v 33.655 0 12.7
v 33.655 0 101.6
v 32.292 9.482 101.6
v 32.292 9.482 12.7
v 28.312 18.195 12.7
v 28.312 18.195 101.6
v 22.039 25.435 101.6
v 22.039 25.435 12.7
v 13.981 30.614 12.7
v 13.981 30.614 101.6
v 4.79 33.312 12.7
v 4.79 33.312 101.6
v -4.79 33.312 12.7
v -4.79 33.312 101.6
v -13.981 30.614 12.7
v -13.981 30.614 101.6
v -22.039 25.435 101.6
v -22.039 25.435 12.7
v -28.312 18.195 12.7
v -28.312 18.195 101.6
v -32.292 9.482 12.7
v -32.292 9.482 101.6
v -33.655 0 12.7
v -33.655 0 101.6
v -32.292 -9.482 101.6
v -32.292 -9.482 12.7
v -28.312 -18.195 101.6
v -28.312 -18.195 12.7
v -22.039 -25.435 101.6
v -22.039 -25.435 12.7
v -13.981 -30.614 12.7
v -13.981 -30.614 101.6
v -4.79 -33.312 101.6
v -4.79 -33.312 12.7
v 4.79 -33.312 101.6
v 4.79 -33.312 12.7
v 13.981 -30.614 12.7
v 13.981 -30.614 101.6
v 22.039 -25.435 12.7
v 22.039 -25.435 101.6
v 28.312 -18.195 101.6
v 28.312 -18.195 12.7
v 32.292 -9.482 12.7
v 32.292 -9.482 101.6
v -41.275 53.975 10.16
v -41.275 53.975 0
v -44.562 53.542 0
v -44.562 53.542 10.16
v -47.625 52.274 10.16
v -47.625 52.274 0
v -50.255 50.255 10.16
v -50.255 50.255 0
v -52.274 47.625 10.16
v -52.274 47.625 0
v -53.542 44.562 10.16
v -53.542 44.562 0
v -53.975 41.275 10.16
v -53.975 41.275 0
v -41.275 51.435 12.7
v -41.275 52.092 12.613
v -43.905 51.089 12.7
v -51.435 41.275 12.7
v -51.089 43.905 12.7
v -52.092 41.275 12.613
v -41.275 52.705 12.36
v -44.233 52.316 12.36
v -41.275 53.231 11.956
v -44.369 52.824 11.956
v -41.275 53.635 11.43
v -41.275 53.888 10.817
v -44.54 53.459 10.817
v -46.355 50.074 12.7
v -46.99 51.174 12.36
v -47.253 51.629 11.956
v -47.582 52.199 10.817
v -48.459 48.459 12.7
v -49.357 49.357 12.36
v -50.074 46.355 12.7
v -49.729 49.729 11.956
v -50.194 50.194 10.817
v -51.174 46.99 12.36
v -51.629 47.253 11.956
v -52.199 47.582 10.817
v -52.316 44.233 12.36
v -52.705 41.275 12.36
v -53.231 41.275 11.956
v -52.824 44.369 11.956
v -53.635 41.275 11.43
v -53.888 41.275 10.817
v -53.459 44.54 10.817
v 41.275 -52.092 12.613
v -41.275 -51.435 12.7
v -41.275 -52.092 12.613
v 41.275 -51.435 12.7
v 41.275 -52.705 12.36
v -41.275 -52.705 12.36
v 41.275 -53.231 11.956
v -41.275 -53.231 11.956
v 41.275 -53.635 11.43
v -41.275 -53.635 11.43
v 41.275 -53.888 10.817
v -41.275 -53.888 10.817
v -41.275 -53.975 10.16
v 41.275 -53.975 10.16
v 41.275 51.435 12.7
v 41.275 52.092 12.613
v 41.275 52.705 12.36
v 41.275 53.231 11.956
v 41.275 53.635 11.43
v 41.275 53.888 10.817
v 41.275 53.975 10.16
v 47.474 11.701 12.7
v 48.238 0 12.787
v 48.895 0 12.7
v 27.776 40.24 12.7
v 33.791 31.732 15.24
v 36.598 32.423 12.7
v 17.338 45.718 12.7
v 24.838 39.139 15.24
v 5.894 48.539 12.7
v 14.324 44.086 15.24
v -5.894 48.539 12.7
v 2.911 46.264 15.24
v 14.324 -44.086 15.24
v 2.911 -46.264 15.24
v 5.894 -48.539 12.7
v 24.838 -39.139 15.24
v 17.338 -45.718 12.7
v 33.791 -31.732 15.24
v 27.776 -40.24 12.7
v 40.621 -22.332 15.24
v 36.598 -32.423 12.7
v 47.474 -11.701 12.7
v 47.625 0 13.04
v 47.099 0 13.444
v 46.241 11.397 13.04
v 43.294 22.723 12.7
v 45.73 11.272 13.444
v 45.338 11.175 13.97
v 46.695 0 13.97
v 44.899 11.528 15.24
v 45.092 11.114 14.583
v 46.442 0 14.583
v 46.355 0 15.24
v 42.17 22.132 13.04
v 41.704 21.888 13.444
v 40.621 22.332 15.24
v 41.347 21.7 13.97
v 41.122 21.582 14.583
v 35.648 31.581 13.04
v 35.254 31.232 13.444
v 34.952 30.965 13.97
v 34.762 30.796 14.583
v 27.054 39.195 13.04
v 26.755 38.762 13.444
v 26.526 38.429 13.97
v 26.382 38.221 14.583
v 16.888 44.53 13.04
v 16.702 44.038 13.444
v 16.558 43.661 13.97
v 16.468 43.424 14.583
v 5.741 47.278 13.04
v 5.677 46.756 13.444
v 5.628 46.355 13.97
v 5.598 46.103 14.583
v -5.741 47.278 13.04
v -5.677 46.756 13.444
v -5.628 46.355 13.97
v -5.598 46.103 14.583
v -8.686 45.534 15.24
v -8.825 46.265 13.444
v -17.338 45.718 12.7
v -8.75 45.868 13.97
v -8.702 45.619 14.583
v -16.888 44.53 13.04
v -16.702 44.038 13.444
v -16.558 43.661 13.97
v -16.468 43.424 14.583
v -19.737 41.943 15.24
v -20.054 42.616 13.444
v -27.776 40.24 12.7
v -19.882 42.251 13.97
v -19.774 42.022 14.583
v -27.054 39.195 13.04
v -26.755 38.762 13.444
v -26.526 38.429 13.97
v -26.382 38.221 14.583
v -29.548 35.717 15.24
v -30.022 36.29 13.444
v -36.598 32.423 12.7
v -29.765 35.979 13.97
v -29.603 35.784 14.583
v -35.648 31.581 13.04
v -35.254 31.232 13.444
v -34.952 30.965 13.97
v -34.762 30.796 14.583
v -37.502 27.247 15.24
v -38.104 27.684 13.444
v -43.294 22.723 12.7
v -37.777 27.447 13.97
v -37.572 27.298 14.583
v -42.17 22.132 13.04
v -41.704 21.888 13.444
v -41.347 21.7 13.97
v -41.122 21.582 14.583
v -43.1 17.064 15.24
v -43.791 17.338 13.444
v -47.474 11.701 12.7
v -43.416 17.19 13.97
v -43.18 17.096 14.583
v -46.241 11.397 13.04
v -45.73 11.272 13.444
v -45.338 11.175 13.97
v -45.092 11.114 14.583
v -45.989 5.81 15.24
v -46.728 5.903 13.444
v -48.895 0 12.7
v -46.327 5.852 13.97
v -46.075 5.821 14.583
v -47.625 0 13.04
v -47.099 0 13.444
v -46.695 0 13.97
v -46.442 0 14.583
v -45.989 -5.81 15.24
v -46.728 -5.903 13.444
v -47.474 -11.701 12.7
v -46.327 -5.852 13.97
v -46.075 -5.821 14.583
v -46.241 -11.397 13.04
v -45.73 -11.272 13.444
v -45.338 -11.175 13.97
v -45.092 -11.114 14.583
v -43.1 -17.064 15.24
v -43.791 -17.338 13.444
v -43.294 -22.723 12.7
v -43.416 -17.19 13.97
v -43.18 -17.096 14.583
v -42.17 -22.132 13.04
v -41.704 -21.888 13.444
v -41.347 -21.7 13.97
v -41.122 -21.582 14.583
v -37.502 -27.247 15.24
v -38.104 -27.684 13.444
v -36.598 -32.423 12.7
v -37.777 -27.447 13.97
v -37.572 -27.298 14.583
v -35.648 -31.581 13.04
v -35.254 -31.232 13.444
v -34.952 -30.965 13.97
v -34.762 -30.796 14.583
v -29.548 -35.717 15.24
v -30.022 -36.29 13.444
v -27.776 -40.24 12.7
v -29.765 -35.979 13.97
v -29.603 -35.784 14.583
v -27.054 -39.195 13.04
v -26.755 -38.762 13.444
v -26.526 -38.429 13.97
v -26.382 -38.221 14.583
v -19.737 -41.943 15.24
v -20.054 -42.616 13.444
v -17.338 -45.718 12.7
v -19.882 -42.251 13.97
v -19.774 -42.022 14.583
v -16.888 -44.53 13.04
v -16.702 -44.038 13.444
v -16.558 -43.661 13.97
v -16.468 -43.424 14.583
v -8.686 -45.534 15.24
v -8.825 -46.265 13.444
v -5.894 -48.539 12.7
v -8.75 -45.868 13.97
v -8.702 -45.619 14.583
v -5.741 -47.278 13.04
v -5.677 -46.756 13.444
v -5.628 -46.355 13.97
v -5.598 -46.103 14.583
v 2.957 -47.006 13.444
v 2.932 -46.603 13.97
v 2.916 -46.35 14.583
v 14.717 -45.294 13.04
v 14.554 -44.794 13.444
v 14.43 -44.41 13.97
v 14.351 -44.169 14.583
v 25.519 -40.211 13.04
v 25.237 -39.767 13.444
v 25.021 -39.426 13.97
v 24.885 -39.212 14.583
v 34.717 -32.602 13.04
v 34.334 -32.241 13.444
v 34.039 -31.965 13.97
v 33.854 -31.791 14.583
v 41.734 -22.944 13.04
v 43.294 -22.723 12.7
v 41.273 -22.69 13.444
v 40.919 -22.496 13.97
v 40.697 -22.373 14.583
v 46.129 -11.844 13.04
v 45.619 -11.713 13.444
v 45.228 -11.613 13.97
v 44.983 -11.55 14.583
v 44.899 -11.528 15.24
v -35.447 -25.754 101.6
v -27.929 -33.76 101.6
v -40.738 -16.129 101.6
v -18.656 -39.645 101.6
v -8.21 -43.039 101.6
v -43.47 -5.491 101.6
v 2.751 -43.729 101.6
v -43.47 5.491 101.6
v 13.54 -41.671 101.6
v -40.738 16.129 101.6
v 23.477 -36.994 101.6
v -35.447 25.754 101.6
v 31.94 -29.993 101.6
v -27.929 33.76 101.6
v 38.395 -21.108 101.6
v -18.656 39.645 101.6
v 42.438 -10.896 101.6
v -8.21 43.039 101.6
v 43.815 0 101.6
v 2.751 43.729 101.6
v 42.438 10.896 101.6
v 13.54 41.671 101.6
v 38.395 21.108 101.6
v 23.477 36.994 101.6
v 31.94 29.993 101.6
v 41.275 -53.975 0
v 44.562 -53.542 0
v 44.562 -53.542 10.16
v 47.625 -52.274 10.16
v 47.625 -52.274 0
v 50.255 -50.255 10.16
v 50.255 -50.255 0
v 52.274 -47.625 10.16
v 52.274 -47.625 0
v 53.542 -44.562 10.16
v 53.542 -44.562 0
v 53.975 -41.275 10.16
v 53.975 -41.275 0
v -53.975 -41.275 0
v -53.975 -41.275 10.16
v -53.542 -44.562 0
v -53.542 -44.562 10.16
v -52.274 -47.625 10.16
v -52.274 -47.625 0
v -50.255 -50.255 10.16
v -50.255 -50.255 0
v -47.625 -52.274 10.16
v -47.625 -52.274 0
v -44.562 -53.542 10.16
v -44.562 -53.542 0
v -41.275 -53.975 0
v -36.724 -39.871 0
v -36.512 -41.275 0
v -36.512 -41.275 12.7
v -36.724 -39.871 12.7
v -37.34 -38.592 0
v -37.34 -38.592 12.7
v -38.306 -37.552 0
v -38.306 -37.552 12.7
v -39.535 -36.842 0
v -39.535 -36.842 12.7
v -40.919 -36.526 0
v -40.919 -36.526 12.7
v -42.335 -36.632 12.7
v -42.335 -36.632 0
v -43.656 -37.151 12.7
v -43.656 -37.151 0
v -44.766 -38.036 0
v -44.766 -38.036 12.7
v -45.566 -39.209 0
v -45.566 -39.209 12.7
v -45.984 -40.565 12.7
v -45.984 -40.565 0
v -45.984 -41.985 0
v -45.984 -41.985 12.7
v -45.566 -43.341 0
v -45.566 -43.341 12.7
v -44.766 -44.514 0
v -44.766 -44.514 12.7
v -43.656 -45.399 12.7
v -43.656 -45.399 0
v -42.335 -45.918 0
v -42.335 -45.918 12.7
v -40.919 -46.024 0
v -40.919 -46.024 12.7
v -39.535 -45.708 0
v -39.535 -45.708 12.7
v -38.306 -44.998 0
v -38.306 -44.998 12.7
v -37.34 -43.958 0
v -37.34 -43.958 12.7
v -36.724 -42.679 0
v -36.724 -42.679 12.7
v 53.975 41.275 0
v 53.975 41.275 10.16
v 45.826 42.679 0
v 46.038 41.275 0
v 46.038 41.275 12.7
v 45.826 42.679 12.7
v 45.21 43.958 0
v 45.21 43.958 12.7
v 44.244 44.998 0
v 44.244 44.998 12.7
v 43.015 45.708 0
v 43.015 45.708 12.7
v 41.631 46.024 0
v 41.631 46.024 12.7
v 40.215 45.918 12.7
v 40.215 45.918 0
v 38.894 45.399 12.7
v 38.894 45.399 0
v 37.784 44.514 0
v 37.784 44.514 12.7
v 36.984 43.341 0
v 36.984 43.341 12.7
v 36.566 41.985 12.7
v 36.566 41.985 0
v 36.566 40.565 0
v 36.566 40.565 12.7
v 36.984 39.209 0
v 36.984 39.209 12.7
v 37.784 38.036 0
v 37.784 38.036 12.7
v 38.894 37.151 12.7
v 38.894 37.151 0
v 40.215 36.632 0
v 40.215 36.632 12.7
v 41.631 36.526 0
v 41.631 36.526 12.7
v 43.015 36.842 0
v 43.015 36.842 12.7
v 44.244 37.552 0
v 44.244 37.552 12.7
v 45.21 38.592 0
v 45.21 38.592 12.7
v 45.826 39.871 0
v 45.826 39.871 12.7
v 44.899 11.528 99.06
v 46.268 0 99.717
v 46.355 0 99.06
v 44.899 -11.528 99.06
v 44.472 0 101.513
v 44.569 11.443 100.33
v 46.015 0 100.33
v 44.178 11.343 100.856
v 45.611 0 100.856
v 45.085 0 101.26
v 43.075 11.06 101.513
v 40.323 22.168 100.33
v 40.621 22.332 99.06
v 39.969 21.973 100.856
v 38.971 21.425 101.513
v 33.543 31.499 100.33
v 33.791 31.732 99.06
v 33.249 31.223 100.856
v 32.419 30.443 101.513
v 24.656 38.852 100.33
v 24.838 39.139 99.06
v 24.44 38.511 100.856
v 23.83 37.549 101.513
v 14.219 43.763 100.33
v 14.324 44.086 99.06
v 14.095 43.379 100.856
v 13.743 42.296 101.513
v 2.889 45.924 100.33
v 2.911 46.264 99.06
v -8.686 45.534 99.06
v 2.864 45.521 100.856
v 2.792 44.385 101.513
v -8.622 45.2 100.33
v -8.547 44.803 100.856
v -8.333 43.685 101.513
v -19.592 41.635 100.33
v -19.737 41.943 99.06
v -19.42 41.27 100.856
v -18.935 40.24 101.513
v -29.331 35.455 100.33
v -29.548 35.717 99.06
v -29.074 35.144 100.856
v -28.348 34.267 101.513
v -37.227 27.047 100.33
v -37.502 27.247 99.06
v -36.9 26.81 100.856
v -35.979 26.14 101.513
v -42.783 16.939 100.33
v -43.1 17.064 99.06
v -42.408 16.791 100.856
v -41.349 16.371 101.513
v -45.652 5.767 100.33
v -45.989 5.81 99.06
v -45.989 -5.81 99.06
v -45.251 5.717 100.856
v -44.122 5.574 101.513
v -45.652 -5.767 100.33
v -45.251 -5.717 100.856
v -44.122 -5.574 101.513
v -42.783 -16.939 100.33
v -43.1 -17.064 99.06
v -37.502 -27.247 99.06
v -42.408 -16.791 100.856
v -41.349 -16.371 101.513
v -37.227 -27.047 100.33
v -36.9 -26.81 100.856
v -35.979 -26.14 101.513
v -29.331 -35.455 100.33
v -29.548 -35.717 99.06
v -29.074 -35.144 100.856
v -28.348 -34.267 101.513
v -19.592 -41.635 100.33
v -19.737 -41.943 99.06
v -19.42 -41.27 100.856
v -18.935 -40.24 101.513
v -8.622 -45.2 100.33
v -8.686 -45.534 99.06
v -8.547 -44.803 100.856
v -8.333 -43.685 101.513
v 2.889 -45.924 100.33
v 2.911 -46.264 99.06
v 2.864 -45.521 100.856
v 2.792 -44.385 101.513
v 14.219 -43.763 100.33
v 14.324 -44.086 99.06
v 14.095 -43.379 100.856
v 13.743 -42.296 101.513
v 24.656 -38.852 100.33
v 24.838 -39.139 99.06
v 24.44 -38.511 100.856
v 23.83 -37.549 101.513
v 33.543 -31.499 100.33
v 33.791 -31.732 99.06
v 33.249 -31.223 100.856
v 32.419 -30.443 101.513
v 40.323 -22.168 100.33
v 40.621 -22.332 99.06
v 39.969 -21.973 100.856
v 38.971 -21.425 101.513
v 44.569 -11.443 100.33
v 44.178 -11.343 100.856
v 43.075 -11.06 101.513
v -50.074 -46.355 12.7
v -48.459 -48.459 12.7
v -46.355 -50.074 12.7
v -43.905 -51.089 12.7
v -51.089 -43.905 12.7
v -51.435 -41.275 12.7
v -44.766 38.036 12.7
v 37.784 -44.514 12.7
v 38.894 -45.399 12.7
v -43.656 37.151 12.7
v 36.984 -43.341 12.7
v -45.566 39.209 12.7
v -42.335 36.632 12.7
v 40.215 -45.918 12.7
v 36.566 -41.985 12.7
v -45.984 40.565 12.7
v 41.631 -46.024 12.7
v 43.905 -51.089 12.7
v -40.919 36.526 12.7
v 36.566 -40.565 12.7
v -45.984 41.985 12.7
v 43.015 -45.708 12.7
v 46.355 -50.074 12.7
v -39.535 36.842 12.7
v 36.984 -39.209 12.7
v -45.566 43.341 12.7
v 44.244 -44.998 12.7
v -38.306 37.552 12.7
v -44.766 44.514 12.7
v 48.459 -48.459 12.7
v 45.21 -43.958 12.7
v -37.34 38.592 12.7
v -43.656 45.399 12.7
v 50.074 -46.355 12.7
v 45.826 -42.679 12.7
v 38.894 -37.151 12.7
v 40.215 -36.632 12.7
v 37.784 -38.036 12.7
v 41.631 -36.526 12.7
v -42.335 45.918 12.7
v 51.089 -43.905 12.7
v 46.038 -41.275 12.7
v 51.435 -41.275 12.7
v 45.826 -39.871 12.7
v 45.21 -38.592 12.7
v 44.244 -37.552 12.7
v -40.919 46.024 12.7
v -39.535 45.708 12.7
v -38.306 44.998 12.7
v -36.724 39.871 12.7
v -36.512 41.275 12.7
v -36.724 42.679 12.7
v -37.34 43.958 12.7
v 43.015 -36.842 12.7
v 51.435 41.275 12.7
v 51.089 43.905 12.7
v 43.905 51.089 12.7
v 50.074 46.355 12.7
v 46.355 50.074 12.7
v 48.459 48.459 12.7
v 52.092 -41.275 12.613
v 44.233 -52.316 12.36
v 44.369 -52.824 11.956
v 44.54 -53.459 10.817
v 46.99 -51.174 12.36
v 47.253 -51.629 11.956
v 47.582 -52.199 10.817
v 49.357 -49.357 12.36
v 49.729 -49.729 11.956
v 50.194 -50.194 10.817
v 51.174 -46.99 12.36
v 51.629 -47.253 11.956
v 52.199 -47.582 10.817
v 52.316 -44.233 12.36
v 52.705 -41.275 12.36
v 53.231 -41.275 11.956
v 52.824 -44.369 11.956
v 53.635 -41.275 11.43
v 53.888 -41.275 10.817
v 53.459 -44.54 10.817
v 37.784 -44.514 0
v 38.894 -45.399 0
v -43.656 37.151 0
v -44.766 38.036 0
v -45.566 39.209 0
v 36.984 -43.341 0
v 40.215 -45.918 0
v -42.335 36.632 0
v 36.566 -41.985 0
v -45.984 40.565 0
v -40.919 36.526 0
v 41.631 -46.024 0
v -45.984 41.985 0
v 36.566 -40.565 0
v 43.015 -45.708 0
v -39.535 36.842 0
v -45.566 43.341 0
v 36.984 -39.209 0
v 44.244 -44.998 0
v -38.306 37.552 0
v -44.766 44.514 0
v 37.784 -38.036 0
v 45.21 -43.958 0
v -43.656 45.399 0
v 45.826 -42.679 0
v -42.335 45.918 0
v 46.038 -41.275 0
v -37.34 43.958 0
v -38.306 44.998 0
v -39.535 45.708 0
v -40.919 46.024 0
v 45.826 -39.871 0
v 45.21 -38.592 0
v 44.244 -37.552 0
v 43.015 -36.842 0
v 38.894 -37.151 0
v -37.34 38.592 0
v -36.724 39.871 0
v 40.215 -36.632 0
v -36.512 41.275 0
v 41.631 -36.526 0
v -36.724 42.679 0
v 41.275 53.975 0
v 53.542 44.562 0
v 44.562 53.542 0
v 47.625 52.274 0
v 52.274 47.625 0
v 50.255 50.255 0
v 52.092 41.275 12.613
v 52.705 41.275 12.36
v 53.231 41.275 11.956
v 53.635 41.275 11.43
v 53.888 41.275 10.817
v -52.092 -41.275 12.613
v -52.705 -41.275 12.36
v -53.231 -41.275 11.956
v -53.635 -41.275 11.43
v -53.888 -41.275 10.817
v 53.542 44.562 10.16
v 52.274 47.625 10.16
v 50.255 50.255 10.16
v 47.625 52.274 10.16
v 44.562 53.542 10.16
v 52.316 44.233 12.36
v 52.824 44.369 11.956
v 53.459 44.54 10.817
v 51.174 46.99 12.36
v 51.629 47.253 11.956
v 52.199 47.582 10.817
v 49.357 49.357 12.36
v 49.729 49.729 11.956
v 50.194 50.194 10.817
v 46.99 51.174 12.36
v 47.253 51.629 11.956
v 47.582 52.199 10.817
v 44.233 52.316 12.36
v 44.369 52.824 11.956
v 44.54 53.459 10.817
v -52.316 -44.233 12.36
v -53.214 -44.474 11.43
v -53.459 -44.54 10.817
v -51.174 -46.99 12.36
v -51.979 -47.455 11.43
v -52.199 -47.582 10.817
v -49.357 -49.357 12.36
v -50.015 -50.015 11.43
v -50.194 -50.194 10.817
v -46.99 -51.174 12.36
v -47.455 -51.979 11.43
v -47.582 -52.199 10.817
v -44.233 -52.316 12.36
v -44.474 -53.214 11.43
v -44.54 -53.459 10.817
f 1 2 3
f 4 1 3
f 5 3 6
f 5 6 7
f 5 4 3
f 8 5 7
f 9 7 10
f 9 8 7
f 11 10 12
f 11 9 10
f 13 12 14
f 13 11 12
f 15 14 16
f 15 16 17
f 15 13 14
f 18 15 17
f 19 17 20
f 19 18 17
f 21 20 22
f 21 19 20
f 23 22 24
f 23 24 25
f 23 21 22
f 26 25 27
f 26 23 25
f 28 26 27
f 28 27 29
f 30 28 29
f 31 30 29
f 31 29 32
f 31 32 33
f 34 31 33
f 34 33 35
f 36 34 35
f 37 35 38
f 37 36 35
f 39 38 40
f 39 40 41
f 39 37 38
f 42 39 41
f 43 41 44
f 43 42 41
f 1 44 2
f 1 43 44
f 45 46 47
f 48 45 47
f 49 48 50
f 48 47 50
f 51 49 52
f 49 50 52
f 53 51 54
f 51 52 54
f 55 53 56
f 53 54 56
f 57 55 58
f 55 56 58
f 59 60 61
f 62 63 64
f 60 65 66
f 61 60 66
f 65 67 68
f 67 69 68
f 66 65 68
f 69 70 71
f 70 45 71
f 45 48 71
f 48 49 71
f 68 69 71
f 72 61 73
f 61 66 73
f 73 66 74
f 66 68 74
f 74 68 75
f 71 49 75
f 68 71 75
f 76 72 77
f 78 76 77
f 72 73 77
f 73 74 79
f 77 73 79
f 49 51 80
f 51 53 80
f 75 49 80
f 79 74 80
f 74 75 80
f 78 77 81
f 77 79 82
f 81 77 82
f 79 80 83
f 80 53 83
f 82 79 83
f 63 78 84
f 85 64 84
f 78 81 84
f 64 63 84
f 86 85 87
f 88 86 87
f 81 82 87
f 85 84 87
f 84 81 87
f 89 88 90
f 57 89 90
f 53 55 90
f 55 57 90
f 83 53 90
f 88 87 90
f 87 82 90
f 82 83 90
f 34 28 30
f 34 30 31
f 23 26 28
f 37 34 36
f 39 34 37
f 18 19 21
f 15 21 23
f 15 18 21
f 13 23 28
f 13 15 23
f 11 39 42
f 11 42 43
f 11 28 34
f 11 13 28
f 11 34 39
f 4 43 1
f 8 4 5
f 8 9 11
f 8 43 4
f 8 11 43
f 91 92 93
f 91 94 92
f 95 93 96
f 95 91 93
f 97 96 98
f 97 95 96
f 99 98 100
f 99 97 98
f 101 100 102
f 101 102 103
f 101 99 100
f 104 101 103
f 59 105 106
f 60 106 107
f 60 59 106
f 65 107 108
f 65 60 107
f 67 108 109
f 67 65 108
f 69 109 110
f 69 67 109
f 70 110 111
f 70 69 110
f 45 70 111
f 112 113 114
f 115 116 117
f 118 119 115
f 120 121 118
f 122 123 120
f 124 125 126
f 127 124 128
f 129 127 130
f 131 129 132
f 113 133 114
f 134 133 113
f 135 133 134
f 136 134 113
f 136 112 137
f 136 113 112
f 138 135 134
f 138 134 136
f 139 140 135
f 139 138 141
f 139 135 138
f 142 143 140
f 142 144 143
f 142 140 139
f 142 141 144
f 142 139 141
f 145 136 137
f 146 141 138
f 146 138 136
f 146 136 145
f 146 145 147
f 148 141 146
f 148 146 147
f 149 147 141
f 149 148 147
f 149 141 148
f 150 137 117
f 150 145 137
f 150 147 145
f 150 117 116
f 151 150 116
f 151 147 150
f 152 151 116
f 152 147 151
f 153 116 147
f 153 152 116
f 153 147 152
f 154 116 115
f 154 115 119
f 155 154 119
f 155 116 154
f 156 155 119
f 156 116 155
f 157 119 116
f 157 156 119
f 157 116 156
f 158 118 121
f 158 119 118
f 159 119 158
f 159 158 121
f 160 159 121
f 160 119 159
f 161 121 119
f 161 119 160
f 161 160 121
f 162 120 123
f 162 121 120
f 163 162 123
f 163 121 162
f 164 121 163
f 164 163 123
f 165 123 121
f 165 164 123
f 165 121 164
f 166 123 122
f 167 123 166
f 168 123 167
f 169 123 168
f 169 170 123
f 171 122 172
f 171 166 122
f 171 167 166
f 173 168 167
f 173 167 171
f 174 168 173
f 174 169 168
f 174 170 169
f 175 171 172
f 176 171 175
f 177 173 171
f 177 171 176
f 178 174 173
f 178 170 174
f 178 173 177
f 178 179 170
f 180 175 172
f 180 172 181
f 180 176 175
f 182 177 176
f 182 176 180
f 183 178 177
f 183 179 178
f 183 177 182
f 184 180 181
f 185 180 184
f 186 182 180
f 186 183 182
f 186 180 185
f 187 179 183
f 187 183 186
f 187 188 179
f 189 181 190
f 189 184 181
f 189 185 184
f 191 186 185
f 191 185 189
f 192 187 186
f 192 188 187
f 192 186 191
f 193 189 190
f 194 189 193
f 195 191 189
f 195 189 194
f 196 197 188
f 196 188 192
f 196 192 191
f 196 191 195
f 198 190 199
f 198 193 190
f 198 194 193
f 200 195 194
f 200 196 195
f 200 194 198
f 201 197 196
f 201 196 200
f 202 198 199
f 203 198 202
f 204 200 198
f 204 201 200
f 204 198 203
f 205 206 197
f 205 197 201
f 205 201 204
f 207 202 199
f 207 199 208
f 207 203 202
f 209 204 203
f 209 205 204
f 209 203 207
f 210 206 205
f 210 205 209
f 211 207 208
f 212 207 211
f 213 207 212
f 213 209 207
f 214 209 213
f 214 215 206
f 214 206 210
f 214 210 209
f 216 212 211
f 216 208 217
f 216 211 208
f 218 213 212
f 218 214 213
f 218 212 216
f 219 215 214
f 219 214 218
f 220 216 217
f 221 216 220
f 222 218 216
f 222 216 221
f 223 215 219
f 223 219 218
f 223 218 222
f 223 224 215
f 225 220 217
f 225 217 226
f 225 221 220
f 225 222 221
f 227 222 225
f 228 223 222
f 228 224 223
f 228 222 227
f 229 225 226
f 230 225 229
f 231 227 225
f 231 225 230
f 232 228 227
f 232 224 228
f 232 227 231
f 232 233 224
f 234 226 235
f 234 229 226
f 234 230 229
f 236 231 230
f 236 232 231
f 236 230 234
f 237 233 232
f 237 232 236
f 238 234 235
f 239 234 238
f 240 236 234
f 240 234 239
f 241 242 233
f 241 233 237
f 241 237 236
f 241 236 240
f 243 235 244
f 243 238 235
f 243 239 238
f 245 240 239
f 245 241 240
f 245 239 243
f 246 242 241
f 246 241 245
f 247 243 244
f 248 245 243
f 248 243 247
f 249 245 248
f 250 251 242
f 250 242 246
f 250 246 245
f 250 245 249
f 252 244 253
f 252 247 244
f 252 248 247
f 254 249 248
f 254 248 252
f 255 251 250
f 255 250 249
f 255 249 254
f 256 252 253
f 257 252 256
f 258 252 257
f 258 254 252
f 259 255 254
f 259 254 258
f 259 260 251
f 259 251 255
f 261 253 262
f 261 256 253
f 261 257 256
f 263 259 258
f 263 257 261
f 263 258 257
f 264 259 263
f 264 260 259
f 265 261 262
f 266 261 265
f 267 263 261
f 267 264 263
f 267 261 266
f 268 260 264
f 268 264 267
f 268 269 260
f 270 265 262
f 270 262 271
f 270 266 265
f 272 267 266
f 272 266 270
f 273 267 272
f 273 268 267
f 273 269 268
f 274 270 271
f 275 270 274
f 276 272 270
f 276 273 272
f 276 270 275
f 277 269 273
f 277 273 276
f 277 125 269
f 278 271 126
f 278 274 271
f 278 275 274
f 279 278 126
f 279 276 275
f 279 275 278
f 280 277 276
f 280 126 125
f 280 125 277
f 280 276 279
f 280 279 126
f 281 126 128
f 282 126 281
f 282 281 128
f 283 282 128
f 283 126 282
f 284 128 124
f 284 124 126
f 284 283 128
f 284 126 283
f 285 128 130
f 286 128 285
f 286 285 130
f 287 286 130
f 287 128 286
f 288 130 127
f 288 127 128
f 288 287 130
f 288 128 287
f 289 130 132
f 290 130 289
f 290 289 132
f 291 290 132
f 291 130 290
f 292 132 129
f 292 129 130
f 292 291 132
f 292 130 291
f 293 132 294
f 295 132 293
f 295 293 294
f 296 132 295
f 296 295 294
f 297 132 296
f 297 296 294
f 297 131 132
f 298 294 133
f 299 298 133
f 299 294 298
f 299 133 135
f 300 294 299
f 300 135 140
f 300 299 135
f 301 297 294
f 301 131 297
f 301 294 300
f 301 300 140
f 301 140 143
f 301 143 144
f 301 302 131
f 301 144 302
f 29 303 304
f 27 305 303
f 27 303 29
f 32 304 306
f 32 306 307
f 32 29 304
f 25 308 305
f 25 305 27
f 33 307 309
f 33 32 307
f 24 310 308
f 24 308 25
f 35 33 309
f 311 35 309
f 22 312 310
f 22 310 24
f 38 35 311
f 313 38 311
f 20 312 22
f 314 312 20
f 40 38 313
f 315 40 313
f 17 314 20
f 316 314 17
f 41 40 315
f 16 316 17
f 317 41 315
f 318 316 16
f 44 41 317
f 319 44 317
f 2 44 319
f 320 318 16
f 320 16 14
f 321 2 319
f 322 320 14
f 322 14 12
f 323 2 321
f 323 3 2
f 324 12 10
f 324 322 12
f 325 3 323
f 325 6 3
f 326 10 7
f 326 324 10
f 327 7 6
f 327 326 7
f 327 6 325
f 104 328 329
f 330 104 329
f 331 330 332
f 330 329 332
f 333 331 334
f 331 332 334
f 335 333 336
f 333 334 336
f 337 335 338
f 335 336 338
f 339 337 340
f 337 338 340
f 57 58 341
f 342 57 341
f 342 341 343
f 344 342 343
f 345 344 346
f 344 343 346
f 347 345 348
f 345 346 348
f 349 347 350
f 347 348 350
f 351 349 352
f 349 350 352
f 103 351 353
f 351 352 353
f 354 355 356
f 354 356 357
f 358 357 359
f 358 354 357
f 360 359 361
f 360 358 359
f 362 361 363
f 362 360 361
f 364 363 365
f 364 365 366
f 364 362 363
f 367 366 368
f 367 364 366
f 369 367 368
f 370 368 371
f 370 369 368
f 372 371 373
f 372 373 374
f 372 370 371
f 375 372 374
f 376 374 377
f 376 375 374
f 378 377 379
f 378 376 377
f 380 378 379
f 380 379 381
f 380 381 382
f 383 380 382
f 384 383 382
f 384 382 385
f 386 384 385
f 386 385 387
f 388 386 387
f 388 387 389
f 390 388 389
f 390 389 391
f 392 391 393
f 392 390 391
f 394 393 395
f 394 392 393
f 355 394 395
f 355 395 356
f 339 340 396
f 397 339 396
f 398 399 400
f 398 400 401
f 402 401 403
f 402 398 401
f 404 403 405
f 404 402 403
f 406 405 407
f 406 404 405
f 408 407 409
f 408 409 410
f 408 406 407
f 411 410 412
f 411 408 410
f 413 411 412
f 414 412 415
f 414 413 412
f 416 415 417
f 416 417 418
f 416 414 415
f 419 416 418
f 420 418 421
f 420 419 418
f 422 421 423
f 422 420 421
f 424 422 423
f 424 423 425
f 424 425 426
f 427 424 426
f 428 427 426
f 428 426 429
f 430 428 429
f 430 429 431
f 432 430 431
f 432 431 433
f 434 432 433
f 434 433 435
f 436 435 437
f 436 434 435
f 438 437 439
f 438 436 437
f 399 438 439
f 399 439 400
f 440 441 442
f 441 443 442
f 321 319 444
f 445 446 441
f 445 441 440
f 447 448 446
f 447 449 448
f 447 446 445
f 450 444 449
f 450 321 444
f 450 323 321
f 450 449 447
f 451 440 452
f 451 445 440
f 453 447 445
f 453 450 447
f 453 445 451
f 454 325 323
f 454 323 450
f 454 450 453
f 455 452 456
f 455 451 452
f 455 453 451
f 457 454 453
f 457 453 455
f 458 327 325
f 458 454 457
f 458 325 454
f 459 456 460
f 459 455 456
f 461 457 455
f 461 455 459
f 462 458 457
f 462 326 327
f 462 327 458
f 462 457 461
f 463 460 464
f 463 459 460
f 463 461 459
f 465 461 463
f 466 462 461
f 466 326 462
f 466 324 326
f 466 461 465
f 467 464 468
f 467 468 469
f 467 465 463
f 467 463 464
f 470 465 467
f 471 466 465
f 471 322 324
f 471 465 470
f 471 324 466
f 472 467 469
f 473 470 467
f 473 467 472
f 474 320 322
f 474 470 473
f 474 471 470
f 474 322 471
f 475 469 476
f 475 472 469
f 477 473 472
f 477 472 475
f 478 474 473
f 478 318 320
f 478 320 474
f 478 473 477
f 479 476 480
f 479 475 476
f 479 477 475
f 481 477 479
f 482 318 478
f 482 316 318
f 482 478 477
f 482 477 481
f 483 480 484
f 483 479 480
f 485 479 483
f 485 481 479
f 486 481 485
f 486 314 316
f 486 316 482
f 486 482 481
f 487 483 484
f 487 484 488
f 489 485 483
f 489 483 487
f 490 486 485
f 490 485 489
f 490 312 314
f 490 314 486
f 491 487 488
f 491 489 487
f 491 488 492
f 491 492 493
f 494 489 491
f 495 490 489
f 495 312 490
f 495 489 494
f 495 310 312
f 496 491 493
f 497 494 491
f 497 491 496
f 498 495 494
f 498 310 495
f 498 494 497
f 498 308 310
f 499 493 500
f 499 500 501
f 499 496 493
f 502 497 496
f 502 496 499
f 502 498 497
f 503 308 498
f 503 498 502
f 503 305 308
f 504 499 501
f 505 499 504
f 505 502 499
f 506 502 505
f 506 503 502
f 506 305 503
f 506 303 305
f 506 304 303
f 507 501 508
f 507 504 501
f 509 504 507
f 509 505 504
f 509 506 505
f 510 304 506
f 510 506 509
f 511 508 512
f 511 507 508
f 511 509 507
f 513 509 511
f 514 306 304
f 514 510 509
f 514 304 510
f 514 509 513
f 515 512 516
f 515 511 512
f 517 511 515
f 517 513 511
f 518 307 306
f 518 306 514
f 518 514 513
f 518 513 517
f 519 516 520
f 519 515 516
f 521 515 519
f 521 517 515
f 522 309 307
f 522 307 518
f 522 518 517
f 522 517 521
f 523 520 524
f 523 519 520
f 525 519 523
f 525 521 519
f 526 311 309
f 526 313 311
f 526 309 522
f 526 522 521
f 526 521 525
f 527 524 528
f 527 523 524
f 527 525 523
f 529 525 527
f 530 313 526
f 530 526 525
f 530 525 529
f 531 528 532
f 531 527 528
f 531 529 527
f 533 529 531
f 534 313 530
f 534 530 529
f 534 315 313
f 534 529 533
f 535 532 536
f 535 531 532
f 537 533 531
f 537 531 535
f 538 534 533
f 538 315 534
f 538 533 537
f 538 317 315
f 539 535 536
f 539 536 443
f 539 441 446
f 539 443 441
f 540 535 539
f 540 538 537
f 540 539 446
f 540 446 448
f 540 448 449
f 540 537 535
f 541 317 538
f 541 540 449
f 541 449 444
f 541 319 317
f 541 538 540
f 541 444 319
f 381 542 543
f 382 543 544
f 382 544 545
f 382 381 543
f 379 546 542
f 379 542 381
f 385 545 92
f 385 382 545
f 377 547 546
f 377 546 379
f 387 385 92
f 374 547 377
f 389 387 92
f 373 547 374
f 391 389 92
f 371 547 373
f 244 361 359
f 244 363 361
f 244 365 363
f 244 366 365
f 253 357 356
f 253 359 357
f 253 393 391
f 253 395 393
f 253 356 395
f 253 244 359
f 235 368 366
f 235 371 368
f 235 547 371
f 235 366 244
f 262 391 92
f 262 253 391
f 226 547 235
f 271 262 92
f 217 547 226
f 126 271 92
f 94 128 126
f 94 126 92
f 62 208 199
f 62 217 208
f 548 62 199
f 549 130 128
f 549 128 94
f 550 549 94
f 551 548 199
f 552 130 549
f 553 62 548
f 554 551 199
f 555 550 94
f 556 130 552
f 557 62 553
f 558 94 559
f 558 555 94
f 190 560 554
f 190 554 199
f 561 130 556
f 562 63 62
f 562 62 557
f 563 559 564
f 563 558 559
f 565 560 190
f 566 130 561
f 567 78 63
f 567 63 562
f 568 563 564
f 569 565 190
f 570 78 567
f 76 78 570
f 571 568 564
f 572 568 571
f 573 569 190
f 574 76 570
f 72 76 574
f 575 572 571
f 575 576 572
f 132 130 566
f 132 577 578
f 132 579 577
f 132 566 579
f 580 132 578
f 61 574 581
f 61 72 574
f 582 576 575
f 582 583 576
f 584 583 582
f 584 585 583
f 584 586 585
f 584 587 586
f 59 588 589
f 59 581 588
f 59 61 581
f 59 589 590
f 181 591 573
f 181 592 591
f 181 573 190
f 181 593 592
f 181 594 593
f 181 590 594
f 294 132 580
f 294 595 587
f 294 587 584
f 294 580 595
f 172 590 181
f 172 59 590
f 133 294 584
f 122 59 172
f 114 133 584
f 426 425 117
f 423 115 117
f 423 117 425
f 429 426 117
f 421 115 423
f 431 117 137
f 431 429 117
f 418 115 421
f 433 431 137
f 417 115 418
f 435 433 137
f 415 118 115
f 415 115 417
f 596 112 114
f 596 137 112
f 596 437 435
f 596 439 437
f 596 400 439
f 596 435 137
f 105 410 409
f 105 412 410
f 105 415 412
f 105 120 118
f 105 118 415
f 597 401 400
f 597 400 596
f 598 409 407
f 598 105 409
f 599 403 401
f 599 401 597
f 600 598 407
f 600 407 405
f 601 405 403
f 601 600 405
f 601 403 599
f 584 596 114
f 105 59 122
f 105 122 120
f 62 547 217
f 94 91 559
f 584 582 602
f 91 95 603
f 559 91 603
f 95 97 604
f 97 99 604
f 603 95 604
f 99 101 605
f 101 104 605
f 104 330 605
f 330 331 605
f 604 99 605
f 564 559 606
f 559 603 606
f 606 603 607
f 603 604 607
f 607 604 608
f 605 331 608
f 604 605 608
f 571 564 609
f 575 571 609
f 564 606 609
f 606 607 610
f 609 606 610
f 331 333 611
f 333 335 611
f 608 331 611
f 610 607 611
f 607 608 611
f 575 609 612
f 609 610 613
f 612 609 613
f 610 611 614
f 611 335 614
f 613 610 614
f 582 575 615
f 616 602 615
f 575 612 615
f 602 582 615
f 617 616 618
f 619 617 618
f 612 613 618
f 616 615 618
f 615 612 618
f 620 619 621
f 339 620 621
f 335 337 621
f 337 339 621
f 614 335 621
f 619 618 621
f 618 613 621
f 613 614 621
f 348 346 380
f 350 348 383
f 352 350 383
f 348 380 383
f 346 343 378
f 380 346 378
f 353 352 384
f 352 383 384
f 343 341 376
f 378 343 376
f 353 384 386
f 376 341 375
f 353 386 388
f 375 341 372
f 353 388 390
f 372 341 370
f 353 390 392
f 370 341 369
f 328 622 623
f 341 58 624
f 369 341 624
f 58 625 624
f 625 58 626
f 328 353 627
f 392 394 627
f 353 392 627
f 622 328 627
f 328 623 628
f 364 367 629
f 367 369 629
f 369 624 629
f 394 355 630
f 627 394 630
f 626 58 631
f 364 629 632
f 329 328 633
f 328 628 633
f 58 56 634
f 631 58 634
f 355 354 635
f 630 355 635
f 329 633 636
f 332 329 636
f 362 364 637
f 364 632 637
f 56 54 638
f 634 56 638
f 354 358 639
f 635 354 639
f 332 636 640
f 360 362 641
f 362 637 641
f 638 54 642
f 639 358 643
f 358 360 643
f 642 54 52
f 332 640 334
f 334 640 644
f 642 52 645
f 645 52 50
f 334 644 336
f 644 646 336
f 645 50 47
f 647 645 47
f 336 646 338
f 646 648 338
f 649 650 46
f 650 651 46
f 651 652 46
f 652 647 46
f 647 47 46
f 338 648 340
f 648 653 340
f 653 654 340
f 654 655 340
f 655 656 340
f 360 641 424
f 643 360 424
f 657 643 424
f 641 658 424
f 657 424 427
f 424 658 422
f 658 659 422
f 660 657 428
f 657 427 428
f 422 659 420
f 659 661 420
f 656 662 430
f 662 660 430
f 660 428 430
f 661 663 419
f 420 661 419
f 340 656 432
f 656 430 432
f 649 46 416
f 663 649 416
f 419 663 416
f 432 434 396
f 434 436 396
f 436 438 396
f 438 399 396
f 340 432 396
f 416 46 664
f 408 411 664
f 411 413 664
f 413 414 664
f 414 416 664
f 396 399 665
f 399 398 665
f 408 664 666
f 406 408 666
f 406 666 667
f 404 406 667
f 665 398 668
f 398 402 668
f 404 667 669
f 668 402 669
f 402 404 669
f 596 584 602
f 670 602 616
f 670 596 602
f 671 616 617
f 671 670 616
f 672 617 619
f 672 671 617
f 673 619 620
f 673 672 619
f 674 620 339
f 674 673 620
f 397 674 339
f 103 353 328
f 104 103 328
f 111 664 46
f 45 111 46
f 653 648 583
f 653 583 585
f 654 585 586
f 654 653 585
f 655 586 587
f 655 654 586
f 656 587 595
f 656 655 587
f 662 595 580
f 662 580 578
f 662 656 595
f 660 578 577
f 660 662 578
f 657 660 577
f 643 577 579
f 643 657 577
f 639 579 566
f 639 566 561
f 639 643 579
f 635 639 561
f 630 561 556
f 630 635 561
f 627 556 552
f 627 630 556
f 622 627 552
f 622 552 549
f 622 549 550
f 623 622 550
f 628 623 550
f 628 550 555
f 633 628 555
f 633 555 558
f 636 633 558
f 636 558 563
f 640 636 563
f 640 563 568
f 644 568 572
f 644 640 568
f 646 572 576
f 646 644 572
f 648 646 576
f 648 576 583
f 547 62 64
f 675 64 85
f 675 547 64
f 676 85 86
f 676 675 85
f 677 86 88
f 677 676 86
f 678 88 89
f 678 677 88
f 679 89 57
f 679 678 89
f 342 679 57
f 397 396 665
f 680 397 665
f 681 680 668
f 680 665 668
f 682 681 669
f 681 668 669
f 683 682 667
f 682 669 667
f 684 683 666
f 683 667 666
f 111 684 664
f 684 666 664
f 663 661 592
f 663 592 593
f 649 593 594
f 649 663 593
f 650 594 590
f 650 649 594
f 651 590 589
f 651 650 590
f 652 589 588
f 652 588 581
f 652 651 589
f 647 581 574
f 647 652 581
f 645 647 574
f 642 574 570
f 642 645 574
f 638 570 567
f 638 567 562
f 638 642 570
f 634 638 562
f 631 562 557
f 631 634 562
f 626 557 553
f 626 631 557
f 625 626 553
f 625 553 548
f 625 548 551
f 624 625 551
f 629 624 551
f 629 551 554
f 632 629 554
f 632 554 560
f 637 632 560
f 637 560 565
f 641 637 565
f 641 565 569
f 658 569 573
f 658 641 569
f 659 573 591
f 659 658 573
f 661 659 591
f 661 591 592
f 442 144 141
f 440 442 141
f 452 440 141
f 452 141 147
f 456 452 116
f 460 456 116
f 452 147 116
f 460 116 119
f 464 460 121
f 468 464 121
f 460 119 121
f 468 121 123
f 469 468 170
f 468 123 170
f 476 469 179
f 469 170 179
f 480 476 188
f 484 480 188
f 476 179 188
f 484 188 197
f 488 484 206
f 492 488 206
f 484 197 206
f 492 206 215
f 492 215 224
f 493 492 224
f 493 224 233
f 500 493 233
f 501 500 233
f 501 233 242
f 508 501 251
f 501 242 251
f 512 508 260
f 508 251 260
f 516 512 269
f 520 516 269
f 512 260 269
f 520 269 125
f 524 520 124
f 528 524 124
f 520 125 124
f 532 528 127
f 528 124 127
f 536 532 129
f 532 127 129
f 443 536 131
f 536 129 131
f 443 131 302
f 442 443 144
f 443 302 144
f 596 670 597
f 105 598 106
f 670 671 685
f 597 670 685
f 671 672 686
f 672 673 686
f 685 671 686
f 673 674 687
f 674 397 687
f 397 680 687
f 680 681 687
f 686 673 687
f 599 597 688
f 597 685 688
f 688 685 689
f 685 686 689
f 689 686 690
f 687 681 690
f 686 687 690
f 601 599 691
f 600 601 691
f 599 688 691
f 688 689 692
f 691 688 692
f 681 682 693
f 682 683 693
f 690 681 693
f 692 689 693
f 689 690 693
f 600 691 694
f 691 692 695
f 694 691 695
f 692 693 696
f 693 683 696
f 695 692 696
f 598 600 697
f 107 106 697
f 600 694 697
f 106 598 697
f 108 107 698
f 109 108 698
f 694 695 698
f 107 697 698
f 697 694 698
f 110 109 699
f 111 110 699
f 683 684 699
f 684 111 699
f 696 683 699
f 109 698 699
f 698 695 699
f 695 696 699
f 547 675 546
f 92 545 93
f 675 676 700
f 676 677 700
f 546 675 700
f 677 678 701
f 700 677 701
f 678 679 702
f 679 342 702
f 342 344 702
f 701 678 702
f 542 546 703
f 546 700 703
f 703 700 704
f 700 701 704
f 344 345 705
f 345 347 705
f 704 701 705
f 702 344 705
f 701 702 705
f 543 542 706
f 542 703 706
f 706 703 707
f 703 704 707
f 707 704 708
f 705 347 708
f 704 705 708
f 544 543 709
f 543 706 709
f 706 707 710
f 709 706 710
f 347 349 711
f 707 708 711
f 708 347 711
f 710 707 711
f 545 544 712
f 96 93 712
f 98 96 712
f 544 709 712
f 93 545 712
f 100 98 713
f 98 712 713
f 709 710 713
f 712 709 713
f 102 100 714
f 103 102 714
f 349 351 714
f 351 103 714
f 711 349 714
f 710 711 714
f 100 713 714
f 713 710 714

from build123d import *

# Parameters (mm, degrees)
F0_R     = 4.7625
F1_DEPTH = 12.7
F2_R     = 46.355
F2_R_2   = 33.655
F3_DEPTH = 88.9
F4_R     = 2.54


with BuildPart() as f1:
    # F0 (on Top) → F1 (new body)
    with BuildSketch(Plane.XY):
        with BuildLine():
            ThreePointArc((53.975, 41.275), (50.255256, 50.255256), (41.275, 53.975))
            Line((41.275, 53.975), (-41.275, 53.975))
            ThreePointArc((-41.275, 53.975), (-50.255256, 50.255256), (-53.975, 41.275))
            Line((-53.975, 41.275), (-53.975, -41.275))
            ThreePointArc((-53.975, -41.275), (-50.255256, -50.255256), (-41.275, -53.975))
            Line((-41.275, -53.975), (41.275, -53.975))
            ThreePointArc((41.275, -53.975), (50.255256, -50.255256), (53.975, -41.275))
            Line((53.975, -41.275), (53.975, 41.275))
        make_face()
        with Locations((-41.275, -41.275)):
            Circle(F0_R, mode=Mode.SUBTRACT)
        with Locations((41.275, -41.275)):
            Circle(F0_R, mode=Mode.SUBTRACT)
        with Locations((-41.275, 41.275)):
            Circle(F0_R, mode=Mode.SUBTRACT)
        with Locations((41.275, 41.275)):
            Circle(F0_R, mode=Mode.SUBTRACT)
    extrude(amount=F1_DEPTH)

    # F2 (on face) → F3 (join)
    with BuildSketch(Plane.XY.offset(12.7)):
        Circle(F2_R)
        Circle(F2_R_2, mode=Mode.SUBTRACT)
    extrude(amount=F3_DEPTH)

    # F4
    f4_edges = [f1.edges().sort_by_distance(p)[0] for p in [
        (-46.355, 0, 12.7),
        (0, -53.975, 12.7),
        (-46.355, 0, 101.6),
    ]]
    fillet(f4_edges, radius=F4_R)


solid = f1.part
